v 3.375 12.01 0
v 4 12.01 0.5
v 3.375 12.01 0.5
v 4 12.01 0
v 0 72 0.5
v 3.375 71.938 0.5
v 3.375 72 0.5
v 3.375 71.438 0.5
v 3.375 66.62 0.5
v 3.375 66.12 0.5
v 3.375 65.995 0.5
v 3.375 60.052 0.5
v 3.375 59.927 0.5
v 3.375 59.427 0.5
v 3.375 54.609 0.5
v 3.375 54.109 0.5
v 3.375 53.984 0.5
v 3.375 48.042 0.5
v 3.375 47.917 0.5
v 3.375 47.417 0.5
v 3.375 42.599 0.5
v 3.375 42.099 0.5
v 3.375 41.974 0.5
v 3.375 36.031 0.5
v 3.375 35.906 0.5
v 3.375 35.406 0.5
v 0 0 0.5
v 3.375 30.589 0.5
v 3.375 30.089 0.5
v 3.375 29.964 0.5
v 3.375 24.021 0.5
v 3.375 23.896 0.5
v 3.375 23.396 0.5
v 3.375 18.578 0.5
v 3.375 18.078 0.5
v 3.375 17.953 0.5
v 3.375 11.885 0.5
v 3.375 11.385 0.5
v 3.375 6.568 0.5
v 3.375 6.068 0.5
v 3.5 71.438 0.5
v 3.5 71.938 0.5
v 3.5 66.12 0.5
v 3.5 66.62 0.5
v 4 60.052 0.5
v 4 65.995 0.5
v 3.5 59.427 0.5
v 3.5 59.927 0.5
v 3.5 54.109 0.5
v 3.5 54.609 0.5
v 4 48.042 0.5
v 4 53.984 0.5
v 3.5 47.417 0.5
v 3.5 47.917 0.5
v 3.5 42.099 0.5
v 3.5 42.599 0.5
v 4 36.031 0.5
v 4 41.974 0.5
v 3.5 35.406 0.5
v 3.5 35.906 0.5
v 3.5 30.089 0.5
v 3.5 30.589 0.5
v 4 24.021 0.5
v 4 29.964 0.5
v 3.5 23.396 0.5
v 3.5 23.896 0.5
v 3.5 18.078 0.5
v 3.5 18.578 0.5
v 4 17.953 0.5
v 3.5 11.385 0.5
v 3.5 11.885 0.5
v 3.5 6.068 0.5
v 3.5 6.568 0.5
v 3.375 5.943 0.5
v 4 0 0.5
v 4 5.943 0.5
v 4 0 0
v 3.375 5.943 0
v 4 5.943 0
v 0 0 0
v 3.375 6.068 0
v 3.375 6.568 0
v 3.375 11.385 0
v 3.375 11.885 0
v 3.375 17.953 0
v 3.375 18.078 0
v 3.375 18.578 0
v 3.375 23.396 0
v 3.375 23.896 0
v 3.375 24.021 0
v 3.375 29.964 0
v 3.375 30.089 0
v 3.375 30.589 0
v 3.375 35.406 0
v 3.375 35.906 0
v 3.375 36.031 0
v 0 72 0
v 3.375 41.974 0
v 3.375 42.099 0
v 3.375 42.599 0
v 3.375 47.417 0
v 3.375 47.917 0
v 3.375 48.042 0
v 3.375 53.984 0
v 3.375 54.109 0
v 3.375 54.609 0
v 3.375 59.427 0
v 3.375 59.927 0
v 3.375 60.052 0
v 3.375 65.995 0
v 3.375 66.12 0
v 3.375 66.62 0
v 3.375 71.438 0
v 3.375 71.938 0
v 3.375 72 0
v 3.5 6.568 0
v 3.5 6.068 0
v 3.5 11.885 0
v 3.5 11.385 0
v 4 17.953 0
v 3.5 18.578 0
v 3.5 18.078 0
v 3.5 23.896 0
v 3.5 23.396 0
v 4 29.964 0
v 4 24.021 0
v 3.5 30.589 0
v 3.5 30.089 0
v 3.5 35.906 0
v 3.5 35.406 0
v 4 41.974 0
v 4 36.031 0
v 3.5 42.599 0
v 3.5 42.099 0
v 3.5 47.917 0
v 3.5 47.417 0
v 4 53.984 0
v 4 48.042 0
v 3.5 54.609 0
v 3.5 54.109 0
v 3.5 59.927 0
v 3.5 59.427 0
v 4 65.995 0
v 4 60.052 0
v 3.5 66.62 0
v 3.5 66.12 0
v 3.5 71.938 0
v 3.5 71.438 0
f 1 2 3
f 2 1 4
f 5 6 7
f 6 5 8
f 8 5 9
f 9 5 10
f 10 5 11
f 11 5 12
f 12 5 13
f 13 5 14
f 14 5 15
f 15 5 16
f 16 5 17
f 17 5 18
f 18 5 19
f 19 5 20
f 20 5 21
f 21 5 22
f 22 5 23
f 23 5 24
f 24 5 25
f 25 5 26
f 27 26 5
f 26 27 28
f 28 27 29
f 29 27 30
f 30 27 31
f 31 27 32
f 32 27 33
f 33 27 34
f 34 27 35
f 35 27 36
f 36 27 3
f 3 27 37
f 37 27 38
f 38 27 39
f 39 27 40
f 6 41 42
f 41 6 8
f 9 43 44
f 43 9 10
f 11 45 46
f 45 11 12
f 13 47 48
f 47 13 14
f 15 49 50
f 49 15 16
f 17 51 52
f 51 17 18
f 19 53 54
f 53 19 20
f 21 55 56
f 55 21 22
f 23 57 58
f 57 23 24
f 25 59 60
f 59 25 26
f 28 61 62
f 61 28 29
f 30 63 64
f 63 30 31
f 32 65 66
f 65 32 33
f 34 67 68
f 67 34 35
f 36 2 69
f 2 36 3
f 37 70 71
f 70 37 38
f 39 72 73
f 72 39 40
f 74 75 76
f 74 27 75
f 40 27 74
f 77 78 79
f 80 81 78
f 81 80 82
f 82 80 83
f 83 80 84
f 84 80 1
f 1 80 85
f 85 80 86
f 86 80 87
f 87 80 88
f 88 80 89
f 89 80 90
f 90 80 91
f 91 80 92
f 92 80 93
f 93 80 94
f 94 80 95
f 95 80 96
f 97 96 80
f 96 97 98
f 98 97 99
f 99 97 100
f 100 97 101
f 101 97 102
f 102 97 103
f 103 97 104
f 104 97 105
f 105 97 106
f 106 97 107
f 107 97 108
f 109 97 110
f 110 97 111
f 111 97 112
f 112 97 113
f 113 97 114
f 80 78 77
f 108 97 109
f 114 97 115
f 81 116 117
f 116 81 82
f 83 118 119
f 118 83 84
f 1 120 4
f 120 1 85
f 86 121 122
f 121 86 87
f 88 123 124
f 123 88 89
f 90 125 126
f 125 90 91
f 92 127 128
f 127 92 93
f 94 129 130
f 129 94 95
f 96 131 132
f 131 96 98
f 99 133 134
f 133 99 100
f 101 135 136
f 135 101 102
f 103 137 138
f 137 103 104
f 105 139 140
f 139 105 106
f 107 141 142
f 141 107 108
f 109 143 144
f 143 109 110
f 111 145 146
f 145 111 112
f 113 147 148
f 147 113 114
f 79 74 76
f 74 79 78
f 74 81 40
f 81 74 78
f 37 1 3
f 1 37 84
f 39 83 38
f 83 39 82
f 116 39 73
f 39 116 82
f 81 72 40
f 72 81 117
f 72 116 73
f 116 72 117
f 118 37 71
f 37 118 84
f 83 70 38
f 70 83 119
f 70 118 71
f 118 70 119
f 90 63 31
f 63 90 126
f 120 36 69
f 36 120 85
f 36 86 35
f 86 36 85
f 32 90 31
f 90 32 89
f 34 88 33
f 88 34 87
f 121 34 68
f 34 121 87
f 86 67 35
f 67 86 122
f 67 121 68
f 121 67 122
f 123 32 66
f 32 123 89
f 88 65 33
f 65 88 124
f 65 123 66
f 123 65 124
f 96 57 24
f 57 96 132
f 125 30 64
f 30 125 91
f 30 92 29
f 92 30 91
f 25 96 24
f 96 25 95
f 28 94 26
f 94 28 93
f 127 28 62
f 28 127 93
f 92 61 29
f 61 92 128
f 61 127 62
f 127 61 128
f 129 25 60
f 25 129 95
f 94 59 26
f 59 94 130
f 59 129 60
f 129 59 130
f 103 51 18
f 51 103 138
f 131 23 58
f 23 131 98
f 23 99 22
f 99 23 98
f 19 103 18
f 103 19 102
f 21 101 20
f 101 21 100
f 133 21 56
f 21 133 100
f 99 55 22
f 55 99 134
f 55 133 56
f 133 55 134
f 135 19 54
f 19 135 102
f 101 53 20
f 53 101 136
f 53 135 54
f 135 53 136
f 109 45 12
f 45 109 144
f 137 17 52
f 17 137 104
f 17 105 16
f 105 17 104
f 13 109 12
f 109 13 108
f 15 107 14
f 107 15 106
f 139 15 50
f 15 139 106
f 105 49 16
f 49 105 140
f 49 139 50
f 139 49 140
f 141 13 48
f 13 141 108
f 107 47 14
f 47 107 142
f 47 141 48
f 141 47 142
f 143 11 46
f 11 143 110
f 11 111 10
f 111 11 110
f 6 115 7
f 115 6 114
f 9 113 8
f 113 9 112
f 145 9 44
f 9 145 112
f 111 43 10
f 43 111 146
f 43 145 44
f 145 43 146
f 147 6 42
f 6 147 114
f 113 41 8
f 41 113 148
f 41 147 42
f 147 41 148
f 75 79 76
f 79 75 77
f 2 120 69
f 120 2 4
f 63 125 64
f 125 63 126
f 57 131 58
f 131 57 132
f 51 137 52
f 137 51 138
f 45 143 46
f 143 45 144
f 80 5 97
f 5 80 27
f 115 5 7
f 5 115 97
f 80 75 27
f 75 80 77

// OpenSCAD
// file: modus.scad
//Corner Joint - allows the sides of two parts to create inlayed corner. Aids with welding.
//need to verify module math is the same throughout all parts.

module cornerjoint(Z,L,H,EndGap,PadL,PadH,CJangle,CJcenter){
    //change so that H = Z of inlayed part (usually 0.5)
    //add center and angle in degrees option, orgin far side of cut out area

     if((CJangle==0)&&(CJcenter==0))
      {    
        translate([0,0,0])
        rotate([0,0,CJangle])
        difference(){
        cube([L,H+PadH,Z]);
        translate([EndGap,H,0])
        cube([PadL,PadH,Z]);
        translate([L-EndGap-PadL,H,0])
        cube([PadL,PadH,Z]);}
      }    
else if((CJangle==90)&&(CJcenter==0))
      {    
        translate([H+PadH,0,0])
        rotate([0,0,CJangle])
        difference(){
        cube([L,H+PadH,Z]);
        translate([EndGap,H,0])
        cube([PadL,PadH,Z]);
        translate([L-EndGap-PadL,H,0])
        cube([PadL,PadH,Z]);}
      }
else if((CJangle==180)&&(CJcenter==0))       
      {    
        translate([L,H+PadH,0])
        rotate([0,0,CJangle])
        difference(){
        cube([L,H+PadH,Z]);
        translate([EndGap,H,0])
        cube([PadL,PadH,Z]);
        translate([L-EndGap-PadL,H,0])
        cube([PadL,PadH,Z]);}
      }
else if((CJangle==270)&&(CJcenter==0))
      {    
        translate([0,L,0])
        rotate([0,0,CJangle])
        difference(){
        cube([L,H+PadH,Z]);
        translate([EndGap,H,0])
        cube([PadL,PadH,Z]);
        translate([L-EndGap-PadL,H,0])
        cube([PadL,PadH,Z]);}
      }  
      
//centered     
   
else if((CJangle==0)&&(CJcenter==1))
      {    
        translate([-L/2,0,0])
        rotate([0,0,CJangle])
        difference(){
        cube([L,H+PadH,Z]);
        translate([EndGap,H,0])
        cube([PadL,PadH,Z]);
        translate([L-EndGap-PadL,H,0])
        cube([PadL,PadH,Z]);}
      }  
else if((CJangle==90)&&(CJcenter==1))
      {    
        translate([0,-L/2,0])
        rotate([0,0,CJangle])
        difference(){
        cube([L,H+PadH,Z]);
        translate([EndGap,H,0])
        cube([PadL,PadH,Z]);
        translate([L-EndGap-PadL,H,0])
        cube([PadL,PadH,Z]);}
      }
else if((CJangle==180)&&(CJcenter==1))       
      {    
        translate([L/2,0,0])
        rotate([0,0,CJangle])
        difference(){
        cube([L,H+PadH,Z]);
        translate([EndGap,H,0])
        cube([PadL,PadH,Z]);
        translate([L-EndGap-PadL,H,0])
        cube([PadL,PadH,Z]);}
      }
else if((CJangle==270)&&(CJcenter==1))
      {    
        translate([0,L/2,0])
        rotate([0,0,CJangle])
        difference(){
        cube([L,H+PadH,Z]);
        translate([EndGap,H,0])
        cube([PadL,PadH,Z]);
        translate([L-EndGap-PadL,H,0])
        cube([PadL,PadH,Z]);}
      }
} //end cornerjoint module

//Tab Insert - used to cut a hole for an abutting part to insert into. Typically aids with welding the two parts.
module tabinsert(X,Y,Z,dGap,cGap,c1,c2,c3,c4,c5,c6,c7,c8,center){
    translate([-dGap-(center*(X/2)),-dGap-(center*(Y/2)),0]){
        //main cut
        cube([X+(dGap*2),Y+(dGap*2),Z]);
        //corner c1c2
        translate([-cGap,(Y+(dGap*2))-c1+cGap,0])
            {
        cube([c2,c1,Z]);}
       //corner c3c4
       translate([(X+(dGap*2))-c3+cGap,(Y+(dGap*2))-c4+cGap,0]){
           cube([c3,c4,Z]);
       }
       //corner c5c6
       translate([(X+(dGap*2))-c6+cGap,-cGap,0])
      {
          cube([c6,c5,Z]);
      }
       
       //corner c7c8 
       translate([-cGap,-cGap,0]){
           cube([c7,c8,Z]);
       }
    
    } //end center translate
} //end tabinsert module
 

module nut(flattoflat,nutheight){  //distance from one flat side to the other flat side "A/F"

//typical sizes found here:
//https://en.wikipedia.org/wiki/Nut_(hardware)

difference(){
    translate([0,0,nutheight/2])
cube(size = [10,10,nutheight], center = true);
    
for(i=[1:6]){
    rotate([0,0,i*60])
difference(){
    translate([-10,0,0])
    cube([20,20,nutheight]);
    translate([-10,0,0])
    cube([20,flattoflat/2,nutheight]);
}  //end difference
}  //end for
}  //end differeence
}  //end module
// file: vars.scad
brickW=6; 
brickL=24;
brickCH=6; //Is brick height being shortened by d1z??

//3.625 x 2.25 x 8
//6 x 12 x 6

grateX=56;
grateY=23;
grateH=37; //Height mounted above press's frame
grateA=17.5; //angle of grate

//grateX=56;
//grateY=23;
//grateH=37; //Height mounted above press's frame
//grateA=17.5; //angle of grate


$fn=8; //defines resolution of circles. 8 is okay for review. 100  or greater should be used for for final dxf export.

dZstandard=0.5; //thickness of steel to be cut for drawer parts
fZstandard=0.5;
aZstandard=0.5; //thickness of steel to be cut for arm parts
hZstandard=0.125;

fBOLTHOLEstandardD=1; //standard bolts used on frame
aBOLTHOLEstandardD=1;

sliderodholeOD=1.2; 
d1bushingOD=1.25;
d1bushingL=1.25;
d1shaftOD=1;
d1bolt1OD=1;
d1bolt2OD=0.75;
d1nut2AF=1.25;
d1nut2H=0.665;


dGap=0.03125; //gap between a hole cut's edge and the part sitting within the hole. //D3 appears to use 0.3125, is this in error?

//all parts set to standard thickness below
//off standard preferences can be defined below

//drawer
drawergap=0.0283;  //extra room for drawer to slide in the space between f1 and f4
drawerHgap=0.1884;  //total extra space from drawer sides to frame walls. sum of both sides.

d2clevispinaccessholeOD=3;

d1z=dZstandard;
d2z=dZstandard;
d3z=dZstandard;
d4z=dZstandard;
d5z=dZstandard;
d6z=dZstandard;
d5z=dZstandard;
d7z=dZstandard;
d8z=dZstandard;
d9z=dZstandard;

d11z=dZstandard;
d12z=dZstandard;


//frame

f1y=6;
f1z=fZstandard;


f2y=3.5;
f2z=fZstandard;

f3y=3.5;
f3z=fZstandard;

f4y=11;
f4z=fZstandard;

f5y=3.5;
f5z=fZstandard;

f6y=8;
f6z=fZstandard;

f8y=brickW;
f8z=fZstandard;
f8boltD=1;

f9y=4.5;

f9z=fZstandard;




f12z=fZstandard;   

f11x=1.25;
f11z=fZstandard;

f13z=fZstandard;

f14y=3.5;
f14z=fZstandard;

//arms

a1x=4;
a1z=aZstandard;
a1out=24; //length from frame to A5 edge for bricks to sit on as they exit

a2x=6;
a2z=aZstandard;

a3x=4;
a3y=72;
a3z=aZstandard;

a4x=6;
a4y=72;
a4z=aZstandard;

a5x=6;
a5y=72;
a5z=aZstandard;

a6z=aZstandard;

//guards

h1x=grateX;
h1y=grateH;  //might need to tweak for grate thickness

h1z=hZstandard;
h2z=hZstandard;
h3z=hZstandard;
h4z=hZstandard;
h5z=hZstandard;
h6z=hZstandard;
h7z=hZstandard;
h8z=hZstandard;

//
//Input your main cylinder's dimenions here
//
cylMainBore = 5;
cylMainStroke = 16;
cylMainExt = 43;
cylMainRet = 27;
cylMainA = (cylMainRet-cylMainStroke); //center to center minus stroke length
cylMainB = 0.25; // cylinder wall thickness
cylMainD = 2.5; //Rod OD
cylMainE = 5.75; //rear pin holder width
cylMainG = 4; //rod pin holder width
cylMainJ = 3.8; //distance from the end of the cylinder body to rod pin center
cylMainR = 1.52; //pin hole ID
cylMainS = 2.5; //pin holder OD

//
//Input your drawer cylinder's dimenions here
//
//
cylDrawerBore = 5;
cylDrawerStroke = 16;
cylDrawerExt = 43;
cylDrawerRet = 27;
cylDrawerA = (cylMainRet-cylMainStroke); //center to center minus stroke length
cylDrawerB = 0.25; // cylinder wall thickness
cylDrawerD = 2.5; //Rod OD
cylDrawerE = 5.75; //rear pin holder width
cylDrawerG = 4; //rod pin holder width
cylDrawerJ = 3.8; //distance from the end of the cylinder body to rod pin center
cylDrawerR = 1.52; //pin hole ID
cylDrawerS = 2.5; //pin holder OD

cylinderDRAWERbodyH=3; //measured when in position, largest length from top to bottom of cylinder
cylinderDRAWERminC2C=0; //drawer's hydraulic cylinder's distance from the center of one mounting hole to the center of the other when fully compressed.
cylinderDRAWERmaxC2C=0; ///drawer's hydraulic cylinder's distance from the center of one mounting hole to the center of the other when fully extended.
cylinderDRAWERrodclevisW=2.5; //width of cylinders' clevis on end of rod
cylinderDRAWERrodclevisID=1;
cylinderDRAWERrodclevisOD=2;
cylinderDRAWERrearclevisW=2.5; //width of mounting clevis cylinder body
cylinderDRAWERrearclevisID=1;
cylinderDRAWERrearclevisOD=2;
cylinderDRAWERrearclevisClearance=3; //usable space around rear clevis pin (in diameter). be aware of hyraulic fittings.

//the following variables are calculated in order of dependence on preceding variables

d3x=brickL+(d2z*2);
d3y=brickCH-d1z;
d4x=brickW+d3z+d3z;
d4y=brickCH-d1z;
d5x=brickL+(d2z*2);
d5y=brickW;
d6x=brickL+(d2z*2);
d6y=brickCH;
d7x=cylinderDRAWERrearclevisClearance;
d7y=a4z+d8z+cylinderDRAWERbodyH;
d9x=cylinderDRAWERbodyH+d6z; //should be based on clevis size?
d9y=cylinderDRAWERbodyH+d8z;
d8x=brickL+(d2z*2);
d8y=max(5,(d9x-d6z));   //need to review fundamentals, 5 minimun unless d9 gets larger than d8
d11x=1.5+(d1bolt1OD*2)+d1bushingOD;
d11y=max((0.5+d1bushingL),4);

d12x=d8x;
d12y=d11y+1;

f1x=((brickL+(d2z*2)+drawerHgap+(f9y*2)));
f3x=f1x;

d1x=(brickL+d2z+d2z);
//d1x=(((f1x/2)-(((brickL+(d2z*2)+drawerHgap)/2)-fZstandard-(sliderodholeOD/2)))+(d11x/2))*2;
d1y=((brickW+d3z+d3z)*3)+1;

d2x=d8y+d6z+brickW+d3z+d5y+d3z;
d2y=brickCH;



f11y=f8y;
f6x=brickL+(d2z*2)+(f9y*2)+drawerHgap;

f9x=(f2z+((cylMainS+0.125)/2)+cylMainRet-cylMainJ+1+f4y+drawergap+d2y+f1y);  //leaves 1" between top of cylinder and bottom of F4
f8x=f9x;


f2x=brickL+(d2z*2)+drawerHgap+(f9y*2)-(1.4*2);  //distance between large cut outs in f9

f5x=brickL+(d2z*2)+drawerHgap+(f9y*2)+(a1x*2); //distance between outer edges of each A1

f4x=f5x-0.5;   //same as f5 but minus 0.25 on each side to give a little overhang

f14x=brickL+(1*2)+(.125*2)+(dGap*2); 

f12x=f3x;
f12y=(f3y*2)+brickW;

sliderodoffset=(((brickL+(d2z*2)+drawerHgap)/2)-fZstandard-(sliderodholeOD/2));

distancetof8center=(cylDrawerExt+(a4x/2)+((d9x-d6z)/2)+d6z+(brickW/2)); //F8 center on A1

a1y=distancetof8center+(brickW/2)+a1out;
a2y=a1y;

h7x=f5x-((a1x/2)*2)+(1.5*2);
h7y=cylDrawerStroke;

h8x=f5x-((a1x/2)*2)+(1.5*2);
h8y=a1out-a5x-f5y;  //distance between a5 and f5

hopperBaseX=brickL;
hopperBaseY=brickW;

h2x=grateX;
h2y=sqrt(((h1y-(sin(grateA)*grateY))*(h1y-(sin(grateA)*grateY)))+(((cos(grateA)*grateY)-hopperBaseY)*((cos(grateA)*grateY)-hopperBaseY)));

//h1y-(sin(grateA)*grateY)
//(cos(grateA)*grateY)-hopperBaseY

echo(h1y-(sin(grateA)*grateY));
echo((cos(grateA)*grateY)-hopperBaseY);
echo(h2y);
echo(atan((h1y-(sin(grateA)*grateY))/((cos(grateA)*grateY)-hopperBaseY)));
echo((h1y-(sin(grateA)*grateY))/(h1y));

// ECHO - REQUIRED PARTS BASED ON INPUTS

echo(str("Minimum drawer cylinder stroke length: ",(d3z*2)+d5y+brickW));
//would be cool to validate and confirm user inputed stroke length. set error=1; if drawer cylinder is not long enough. print an echo warning.

echo(str("Grate hieght above ground level: ",(1)));
// main file
include <vars.scad>;
use <modus.scad>;

a3p();

module a3p(){

difference(){
    cube([a3x,a3y,a3z]);
    
    //corner joints
    cjtablength=((a3y-(0.125*5.5))/12);
    cjinsertlength=cjtablength+0.125; 
    for(i=[0:5])
    translate([a3x+0.00001,(i*(cjtablength+cjinsertlength))+(cjinsertlength/2)-(0.125/2)+(cjtablength+(0.125/2)),0])
    rotate([0,0,90])
    cornerjoint(a3z,cjinsertlength,a4z,0.125,0.5,0.125,0,1);
    

    } //end difference
    
}  //end a2p module
